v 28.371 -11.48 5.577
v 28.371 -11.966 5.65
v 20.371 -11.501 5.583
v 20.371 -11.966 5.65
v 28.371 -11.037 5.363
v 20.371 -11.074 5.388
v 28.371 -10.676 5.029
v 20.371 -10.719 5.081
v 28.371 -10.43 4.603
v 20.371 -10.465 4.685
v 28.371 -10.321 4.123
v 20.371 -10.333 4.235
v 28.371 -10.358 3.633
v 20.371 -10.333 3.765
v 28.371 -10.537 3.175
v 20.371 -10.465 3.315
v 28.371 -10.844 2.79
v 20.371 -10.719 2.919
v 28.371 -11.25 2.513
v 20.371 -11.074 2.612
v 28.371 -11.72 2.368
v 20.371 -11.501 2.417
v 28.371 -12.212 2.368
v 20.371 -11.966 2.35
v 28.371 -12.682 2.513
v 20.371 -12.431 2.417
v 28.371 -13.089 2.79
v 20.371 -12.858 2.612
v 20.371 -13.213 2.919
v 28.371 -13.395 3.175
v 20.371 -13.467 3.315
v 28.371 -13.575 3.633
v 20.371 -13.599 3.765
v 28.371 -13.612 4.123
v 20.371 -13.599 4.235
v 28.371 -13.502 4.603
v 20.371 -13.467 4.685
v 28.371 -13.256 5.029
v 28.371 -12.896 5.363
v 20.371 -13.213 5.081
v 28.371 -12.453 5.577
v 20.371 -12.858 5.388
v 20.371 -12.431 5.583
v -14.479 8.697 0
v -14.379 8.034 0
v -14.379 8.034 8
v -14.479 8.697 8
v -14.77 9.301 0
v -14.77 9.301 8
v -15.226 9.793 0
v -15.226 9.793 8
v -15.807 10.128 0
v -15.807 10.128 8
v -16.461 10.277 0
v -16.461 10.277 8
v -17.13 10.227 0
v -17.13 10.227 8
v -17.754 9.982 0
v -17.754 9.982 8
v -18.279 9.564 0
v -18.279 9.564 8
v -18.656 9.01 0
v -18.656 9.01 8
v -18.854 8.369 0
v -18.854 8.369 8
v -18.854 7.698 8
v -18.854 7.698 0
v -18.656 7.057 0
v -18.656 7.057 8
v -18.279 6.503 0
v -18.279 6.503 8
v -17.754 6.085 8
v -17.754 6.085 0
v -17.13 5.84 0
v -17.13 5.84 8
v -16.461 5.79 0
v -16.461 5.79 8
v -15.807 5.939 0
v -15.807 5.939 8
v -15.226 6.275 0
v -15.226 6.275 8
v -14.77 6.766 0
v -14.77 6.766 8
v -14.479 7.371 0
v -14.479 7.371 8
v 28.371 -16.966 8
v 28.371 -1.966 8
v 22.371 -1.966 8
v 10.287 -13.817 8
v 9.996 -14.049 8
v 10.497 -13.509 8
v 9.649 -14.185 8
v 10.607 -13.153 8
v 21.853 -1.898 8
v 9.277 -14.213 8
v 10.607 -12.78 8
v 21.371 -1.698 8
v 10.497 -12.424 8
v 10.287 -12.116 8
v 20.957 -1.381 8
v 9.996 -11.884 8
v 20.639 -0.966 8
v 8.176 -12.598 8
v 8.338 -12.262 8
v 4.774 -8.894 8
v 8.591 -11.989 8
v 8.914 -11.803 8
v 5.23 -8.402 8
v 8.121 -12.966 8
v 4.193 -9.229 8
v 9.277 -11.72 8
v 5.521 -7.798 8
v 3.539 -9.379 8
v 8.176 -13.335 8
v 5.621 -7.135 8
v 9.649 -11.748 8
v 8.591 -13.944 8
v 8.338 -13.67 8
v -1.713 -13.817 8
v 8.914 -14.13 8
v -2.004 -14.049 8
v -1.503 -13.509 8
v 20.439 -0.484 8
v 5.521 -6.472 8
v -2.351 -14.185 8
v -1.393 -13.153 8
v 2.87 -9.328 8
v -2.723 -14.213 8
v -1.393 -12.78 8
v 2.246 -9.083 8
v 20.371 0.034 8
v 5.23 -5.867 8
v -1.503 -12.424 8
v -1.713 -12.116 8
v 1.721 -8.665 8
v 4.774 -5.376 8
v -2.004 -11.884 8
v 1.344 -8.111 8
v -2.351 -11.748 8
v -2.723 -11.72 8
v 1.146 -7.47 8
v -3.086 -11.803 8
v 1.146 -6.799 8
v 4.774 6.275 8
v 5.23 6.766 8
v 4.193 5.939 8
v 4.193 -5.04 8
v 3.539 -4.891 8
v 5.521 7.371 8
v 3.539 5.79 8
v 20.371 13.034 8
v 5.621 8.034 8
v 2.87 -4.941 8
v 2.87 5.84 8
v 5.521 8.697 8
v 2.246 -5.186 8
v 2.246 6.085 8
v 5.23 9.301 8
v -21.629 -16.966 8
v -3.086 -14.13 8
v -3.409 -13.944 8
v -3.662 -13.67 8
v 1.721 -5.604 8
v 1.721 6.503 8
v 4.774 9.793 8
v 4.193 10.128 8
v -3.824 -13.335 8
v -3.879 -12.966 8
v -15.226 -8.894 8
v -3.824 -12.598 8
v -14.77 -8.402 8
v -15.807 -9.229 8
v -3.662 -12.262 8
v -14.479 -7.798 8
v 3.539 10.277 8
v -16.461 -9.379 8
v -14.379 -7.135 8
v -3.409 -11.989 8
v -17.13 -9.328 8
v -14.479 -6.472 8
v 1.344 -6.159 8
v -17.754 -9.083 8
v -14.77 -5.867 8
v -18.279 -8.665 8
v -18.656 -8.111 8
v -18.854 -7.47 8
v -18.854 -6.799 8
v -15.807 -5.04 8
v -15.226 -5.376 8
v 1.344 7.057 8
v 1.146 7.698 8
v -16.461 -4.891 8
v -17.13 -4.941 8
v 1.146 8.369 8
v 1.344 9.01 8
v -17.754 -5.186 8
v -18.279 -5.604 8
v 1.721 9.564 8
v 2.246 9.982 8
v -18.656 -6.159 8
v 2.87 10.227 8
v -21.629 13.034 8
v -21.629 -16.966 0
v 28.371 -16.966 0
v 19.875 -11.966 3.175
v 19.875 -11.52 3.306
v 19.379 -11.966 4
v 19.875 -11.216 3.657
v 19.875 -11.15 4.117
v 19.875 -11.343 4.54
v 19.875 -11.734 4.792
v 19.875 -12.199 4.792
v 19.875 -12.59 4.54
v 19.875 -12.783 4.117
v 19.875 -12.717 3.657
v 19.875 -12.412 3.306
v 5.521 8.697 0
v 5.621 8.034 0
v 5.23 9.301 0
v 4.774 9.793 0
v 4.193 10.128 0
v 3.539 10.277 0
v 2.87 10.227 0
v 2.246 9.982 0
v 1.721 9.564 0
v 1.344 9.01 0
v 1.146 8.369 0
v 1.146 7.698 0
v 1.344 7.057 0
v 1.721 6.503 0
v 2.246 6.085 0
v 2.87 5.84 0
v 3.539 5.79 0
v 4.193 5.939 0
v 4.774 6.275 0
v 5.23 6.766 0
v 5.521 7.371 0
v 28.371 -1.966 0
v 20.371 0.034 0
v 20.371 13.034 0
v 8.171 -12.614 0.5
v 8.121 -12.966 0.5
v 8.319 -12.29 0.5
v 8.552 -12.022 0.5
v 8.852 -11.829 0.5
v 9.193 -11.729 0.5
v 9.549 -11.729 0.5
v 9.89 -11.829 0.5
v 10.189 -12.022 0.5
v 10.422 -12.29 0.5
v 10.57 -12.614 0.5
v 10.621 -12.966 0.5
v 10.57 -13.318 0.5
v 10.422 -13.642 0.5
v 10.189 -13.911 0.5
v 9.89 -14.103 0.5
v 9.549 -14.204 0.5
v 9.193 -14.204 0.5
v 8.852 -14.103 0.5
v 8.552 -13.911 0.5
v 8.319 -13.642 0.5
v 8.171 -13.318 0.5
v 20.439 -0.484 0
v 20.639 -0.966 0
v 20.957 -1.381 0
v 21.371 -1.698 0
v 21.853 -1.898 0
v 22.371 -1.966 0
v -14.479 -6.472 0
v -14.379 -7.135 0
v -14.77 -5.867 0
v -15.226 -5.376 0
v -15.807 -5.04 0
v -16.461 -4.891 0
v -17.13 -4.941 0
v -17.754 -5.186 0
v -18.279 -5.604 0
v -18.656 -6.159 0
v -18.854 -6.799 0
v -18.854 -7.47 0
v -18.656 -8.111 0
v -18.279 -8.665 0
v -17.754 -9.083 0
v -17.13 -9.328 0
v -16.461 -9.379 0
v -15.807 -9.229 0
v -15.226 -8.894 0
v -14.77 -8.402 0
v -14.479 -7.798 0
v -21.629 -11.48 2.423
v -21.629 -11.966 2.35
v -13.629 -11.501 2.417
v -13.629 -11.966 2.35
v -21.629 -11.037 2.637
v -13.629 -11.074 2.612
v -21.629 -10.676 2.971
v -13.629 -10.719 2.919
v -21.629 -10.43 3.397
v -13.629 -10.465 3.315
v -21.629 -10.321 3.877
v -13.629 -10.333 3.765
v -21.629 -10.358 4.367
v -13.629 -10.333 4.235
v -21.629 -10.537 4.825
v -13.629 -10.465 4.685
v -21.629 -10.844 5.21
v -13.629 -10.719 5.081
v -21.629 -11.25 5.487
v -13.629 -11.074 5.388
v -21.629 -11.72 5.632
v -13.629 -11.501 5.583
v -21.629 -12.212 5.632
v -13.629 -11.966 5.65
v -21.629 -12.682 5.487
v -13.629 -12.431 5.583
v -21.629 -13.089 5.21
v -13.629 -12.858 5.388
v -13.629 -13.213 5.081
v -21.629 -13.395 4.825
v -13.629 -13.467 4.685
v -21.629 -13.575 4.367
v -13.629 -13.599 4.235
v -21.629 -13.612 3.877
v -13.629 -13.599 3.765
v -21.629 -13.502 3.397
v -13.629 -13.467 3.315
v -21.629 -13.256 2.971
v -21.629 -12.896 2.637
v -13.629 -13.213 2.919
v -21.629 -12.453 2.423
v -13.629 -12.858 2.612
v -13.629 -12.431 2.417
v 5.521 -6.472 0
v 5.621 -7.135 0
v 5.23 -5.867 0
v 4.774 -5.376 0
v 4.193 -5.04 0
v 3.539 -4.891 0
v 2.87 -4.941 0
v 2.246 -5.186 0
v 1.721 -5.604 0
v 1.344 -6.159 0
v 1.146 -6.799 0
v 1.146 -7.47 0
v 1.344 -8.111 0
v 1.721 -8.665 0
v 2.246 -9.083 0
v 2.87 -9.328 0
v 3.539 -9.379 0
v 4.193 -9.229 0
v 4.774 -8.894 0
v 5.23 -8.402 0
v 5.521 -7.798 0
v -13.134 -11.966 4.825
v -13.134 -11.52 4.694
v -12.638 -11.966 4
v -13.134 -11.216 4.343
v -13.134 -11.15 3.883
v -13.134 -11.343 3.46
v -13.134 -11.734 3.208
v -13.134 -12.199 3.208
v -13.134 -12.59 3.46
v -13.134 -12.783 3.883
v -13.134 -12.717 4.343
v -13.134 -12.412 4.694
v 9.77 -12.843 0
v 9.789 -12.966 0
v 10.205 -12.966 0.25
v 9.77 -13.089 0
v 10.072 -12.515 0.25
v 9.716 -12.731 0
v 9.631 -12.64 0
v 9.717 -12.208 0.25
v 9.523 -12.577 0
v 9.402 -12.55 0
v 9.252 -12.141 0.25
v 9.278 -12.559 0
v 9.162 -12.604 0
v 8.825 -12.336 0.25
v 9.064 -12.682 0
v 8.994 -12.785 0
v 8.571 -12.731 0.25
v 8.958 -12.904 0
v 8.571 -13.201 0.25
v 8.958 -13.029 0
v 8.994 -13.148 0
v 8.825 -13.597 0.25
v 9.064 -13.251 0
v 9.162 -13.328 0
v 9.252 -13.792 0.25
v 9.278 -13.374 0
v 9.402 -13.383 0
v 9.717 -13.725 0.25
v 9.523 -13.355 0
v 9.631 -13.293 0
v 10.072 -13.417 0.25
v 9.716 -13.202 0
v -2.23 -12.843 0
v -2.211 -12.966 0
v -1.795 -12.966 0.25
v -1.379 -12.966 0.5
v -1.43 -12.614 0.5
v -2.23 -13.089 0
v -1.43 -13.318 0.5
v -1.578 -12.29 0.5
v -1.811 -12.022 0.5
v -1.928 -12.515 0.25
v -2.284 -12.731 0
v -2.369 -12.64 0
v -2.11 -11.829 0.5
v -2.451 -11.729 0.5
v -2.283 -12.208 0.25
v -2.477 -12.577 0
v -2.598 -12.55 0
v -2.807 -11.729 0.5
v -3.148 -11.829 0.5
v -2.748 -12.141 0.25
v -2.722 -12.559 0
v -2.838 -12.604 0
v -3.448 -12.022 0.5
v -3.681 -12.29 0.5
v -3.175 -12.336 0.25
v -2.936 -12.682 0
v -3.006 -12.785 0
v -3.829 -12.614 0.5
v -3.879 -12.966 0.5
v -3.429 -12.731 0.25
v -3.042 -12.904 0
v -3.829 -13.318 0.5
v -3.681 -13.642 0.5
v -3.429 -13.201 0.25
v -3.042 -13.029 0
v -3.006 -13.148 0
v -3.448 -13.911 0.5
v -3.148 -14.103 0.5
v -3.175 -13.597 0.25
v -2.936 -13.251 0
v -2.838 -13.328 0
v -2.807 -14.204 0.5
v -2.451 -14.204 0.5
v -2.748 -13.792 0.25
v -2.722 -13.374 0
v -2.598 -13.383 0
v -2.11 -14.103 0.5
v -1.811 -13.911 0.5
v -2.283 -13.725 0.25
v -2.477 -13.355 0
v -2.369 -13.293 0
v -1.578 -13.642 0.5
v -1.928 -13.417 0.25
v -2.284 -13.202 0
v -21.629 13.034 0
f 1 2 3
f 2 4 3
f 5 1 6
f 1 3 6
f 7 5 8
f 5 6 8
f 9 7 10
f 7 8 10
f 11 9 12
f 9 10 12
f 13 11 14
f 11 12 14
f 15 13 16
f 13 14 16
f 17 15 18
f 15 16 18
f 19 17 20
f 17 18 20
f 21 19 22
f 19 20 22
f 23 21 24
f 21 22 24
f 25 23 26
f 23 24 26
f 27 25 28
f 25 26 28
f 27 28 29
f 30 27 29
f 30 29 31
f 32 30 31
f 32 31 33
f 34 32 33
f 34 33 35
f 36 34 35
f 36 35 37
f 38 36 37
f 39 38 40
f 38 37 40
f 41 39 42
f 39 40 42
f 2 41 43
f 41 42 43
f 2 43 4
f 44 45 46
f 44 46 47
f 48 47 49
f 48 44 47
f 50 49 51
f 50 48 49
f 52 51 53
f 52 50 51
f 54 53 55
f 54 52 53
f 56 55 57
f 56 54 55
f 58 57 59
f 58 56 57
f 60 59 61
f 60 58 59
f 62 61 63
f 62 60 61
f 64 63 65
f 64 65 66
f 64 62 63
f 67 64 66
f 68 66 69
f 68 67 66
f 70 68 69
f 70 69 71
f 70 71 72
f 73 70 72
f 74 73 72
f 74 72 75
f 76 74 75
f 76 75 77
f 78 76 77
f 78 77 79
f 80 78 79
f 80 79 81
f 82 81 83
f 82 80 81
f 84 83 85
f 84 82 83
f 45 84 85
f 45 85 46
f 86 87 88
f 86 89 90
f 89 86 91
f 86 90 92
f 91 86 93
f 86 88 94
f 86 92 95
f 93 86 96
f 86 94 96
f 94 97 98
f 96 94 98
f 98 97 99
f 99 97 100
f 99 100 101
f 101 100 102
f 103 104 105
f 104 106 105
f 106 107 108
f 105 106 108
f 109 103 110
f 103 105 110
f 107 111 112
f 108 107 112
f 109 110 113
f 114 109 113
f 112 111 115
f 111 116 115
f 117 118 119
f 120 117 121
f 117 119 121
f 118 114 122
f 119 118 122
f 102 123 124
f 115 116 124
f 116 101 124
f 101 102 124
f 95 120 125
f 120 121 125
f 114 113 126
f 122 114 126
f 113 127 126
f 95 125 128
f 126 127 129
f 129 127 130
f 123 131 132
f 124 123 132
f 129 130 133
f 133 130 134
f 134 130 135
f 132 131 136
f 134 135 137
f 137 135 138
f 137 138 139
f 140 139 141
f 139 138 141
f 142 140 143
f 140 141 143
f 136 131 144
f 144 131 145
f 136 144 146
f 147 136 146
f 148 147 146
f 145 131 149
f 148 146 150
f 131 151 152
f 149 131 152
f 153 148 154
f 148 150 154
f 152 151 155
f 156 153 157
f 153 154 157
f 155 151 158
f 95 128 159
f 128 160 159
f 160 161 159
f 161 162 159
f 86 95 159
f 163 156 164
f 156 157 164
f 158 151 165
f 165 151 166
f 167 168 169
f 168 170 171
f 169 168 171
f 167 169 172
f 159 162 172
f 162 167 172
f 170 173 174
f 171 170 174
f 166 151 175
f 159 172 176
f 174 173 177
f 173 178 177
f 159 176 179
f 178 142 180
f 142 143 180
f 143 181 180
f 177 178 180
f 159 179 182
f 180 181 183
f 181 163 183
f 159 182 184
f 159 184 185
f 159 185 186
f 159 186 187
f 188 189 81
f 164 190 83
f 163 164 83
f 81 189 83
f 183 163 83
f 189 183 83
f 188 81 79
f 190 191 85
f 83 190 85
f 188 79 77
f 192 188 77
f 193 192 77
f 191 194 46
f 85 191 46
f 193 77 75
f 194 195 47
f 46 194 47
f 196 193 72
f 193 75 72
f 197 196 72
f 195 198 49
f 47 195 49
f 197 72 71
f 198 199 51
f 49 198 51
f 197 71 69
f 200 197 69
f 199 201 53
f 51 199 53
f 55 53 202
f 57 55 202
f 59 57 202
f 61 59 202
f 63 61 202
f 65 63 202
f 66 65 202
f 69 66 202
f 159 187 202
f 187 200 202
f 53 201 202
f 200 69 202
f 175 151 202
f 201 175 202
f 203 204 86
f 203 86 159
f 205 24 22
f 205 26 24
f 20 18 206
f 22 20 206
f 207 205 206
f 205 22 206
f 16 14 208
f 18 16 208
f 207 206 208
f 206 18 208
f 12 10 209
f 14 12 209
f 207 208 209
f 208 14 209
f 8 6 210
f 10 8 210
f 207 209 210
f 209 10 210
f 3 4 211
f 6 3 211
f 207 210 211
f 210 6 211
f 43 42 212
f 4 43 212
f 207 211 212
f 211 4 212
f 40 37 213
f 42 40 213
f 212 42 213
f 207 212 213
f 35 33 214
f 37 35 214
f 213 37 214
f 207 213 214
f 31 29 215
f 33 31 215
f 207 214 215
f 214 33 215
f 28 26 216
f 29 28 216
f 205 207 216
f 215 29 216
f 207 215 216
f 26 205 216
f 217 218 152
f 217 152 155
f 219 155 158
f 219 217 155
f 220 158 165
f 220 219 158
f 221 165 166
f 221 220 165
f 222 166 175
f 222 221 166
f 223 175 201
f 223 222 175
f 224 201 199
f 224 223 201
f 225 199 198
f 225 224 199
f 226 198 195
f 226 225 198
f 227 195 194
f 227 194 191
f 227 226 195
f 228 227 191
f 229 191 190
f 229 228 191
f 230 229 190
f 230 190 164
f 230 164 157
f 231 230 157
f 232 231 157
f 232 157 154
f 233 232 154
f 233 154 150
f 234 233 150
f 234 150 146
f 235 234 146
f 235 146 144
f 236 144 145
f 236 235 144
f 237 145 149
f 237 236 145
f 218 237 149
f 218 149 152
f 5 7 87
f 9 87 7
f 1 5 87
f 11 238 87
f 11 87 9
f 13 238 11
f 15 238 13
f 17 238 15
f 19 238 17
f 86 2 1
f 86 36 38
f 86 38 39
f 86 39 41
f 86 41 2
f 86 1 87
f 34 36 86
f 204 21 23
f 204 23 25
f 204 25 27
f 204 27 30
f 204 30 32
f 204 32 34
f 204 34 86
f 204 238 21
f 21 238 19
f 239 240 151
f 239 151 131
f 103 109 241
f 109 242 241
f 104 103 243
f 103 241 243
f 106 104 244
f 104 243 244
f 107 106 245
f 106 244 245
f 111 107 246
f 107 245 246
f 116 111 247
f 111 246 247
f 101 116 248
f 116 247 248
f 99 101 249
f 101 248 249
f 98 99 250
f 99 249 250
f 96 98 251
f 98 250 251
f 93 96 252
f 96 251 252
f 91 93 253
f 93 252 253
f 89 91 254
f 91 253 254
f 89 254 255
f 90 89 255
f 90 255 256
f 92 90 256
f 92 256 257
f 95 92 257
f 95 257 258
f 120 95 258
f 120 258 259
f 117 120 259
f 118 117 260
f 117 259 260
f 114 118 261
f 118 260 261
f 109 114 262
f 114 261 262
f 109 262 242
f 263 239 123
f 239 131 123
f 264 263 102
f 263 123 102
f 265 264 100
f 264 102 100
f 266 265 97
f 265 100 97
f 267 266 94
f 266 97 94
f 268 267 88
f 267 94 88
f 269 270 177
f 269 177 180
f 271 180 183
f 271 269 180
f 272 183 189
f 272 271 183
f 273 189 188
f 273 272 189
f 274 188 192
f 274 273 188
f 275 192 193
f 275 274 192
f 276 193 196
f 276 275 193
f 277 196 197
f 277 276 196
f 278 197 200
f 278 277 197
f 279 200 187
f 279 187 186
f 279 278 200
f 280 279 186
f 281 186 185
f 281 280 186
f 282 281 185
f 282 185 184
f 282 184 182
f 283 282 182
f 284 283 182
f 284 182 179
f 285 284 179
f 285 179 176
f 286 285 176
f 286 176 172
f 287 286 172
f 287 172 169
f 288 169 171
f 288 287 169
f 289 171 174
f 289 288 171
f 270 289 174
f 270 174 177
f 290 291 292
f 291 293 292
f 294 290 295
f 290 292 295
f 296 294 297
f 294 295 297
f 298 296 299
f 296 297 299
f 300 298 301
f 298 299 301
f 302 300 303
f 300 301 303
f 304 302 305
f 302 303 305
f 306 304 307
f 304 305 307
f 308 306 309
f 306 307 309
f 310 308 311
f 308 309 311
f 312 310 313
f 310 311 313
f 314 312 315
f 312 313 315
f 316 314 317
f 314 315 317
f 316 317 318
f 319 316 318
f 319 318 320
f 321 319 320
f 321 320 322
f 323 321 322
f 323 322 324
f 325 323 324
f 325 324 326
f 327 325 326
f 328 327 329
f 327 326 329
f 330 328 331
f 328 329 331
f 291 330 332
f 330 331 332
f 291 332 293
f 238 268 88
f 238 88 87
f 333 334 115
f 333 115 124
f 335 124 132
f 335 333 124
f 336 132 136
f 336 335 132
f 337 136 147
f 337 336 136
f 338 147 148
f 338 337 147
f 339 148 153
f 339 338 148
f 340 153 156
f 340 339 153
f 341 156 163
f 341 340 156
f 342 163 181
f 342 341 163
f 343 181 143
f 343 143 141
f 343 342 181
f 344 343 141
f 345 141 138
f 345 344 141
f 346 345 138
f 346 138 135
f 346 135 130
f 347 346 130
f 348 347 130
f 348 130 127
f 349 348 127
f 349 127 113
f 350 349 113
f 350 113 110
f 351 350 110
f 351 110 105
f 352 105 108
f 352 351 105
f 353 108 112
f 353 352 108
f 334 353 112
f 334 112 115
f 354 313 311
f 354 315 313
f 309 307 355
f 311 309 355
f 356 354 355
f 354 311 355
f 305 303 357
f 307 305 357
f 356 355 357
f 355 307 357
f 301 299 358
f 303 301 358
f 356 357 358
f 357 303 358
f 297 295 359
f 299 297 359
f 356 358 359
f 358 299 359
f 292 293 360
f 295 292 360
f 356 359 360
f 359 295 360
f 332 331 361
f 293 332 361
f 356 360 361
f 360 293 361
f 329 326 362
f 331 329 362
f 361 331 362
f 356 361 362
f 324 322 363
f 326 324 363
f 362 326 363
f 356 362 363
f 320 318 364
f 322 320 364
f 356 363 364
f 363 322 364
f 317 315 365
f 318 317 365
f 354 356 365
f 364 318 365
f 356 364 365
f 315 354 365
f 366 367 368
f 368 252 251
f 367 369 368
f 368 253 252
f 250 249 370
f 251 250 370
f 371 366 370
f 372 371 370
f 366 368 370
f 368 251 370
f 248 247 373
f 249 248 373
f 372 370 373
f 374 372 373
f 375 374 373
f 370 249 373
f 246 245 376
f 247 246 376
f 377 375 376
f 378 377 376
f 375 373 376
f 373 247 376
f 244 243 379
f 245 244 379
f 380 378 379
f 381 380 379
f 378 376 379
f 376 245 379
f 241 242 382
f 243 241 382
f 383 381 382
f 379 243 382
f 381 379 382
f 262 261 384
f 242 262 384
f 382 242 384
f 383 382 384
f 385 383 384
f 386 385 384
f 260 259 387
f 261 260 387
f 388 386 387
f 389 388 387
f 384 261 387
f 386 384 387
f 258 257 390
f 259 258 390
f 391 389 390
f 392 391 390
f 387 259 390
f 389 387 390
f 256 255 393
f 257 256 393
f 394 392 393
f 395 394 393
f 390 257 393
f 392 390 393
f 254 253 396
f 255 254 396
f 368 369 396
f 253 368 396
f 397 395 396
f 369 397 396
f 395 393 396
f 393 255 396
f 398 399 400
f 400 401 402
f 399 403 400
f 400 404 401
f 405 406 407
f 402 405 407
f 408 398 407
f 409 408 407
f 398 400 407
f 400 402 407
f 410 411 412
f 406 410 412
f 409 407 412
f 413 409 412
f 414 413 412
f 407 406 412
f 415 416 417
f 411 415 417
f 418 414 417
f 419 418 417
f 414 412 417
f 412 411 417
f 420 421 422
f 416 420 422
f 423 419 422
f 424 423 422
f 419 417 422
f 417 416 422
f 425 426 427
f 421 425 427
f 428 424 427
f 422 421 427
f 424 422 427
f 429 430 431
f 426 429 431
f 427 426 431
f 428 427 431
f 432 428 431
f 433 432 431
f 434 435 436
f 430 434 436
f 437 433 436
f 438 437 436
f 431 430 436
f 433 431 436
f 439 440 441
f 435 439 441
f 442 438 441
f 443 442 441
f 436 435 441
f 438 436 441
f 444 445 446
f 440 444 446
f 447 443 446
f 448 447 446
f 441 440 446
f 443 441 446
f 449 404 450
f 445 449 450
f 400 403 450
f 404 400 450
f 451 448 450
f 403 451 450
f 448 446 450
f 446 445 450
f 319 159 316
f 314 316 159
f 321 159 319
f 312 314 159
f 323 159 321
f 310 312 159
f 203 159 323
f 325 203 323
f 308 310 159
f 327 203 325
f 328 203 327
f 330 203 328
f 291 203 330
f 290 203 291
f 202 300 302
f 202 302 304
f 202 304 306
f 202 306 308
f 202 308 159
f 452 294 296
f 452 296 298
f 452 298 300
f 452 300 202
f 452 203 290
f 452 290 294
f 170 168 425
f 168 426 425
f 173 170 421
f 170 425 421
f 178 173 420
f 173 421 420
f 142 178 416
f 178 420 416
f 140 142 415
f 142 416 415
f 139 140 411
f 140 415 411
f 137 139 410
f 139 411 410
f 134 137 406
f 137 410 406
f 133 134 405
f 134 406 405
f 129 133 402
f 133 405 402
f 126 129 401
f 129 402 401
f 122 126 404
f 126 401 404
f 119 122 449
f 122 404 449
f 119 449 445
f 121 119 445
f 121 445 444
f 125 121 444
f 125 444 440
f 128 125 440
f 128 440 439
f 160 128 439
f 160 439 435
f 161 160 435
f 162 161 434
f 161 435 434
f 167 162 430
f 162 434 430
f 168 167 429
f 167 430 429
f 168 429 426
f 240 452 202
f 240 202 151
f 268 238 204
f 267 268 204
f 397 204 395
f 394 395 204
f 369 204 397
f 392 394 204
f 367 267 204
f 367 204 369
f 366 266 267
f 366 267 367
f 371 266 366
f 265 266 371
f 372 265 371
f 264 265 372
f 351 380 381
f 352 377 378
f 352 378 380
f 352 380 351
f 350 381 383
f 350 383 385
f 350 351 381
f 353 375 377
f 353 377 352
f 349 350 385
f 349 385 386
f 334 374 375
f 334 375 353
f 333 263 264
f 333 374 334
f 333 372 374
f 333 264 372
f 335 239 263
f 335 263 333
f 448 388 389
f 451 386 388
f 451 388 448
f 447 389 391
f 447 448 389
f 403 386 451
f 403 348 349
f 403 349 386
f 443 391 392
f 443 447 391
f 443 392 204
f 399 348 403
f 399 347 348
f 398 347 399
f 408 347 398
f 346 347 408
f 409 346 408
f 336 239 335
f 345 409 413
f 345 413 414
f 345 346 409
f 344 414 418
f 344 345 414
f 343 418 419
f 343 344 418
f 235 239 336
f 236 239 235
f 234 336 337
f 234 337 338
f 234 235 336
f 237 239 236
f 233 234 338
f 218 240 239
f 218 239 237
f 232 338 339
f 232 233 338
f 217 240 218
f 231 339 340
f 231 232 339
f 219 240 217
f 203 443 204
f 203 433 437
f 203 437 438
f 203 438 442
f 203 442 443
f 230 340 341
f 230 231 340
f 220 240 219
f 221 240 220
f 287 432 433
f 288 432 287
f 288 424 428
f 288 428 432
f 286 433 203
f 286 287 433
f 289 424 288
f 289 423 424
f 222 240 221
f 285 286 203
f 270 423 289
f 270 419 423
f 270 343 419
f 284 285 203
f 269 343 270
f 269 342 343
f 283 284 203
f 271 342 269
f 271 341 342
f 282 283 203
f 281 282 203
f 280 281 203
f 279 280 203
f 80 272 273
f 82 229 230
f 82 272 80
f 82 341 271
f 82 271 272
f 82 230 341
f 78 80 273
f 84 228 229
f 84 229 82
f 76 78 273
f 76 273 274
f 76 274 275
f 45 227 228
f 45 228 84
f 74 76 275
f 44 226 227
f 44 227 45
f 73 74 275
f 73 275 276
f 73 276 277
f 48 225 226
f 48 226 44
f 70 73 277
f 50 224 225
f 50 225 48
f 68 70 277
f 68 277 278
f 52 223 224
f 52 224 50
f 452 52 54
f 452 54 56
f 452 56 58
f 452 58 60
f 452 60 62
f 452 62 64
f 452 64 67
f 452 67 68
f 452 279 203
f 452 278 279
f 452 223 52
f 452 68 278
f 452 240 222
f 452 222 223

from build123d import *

# Parameters (mm, degrees)
SKETCH2_R             = 2.25
BOSS_EXTRUDE1_DEPTH   = 8
M3_TAPPED_HOLE1_D     = 2.5
M3_TAPPED_HOLE1_DEPTH = 7.5
M3_TAPPED_HOLE1_TIP   = 0.751075774
M4_TAPPED_HOLE1_D     = 3.3
M4_TAPPED_HOLE1_DEPTH = 8
M4_TAPPED_HOLE1_TIP   = 0.991420021
M4_TAPPED_HOLE2_D     = 3.3
M4_TAPPED_HOLE2_DEPTH = 8
M4_TAPPED_HOLE2_TIP   = 0.991420021
FILLET1_R             = 2


with BuildPart() as part:
    # Sketch2 → Boss-Extrude1 (new body)
    with BuildSketch(Plane.XY):
        Polygon((-21.629213483, 13.033707865), (20.370786517, 13.033707865), (20.370786517, -1.966292135), (28.370786517, -1.966292135), (28.370786517, -16.966292135), (-21.629213483, -16.966292135), align=None)
        with Locations((-16.629213483, 8.033707865)):
            Circle(SKETCH2_R, mode=Mode.SUBTRACT)
        with Locations((3.370786517, 8.033707865)):
            Circle(SKETCH2_R, mode=Mode.SUBTRACT)
        with Locations((-16.629213483, -7.134831461)):
            Circle(SKETCH2_R, mode=Mode.SUBTRACT)
        with Locations((3.370786517, -7.134831461)):
            Circle(SKETCH2_R, mode=Mode.SUBTRACT)
    extrude(amount=BOSS_EXTRUDE1_DEPTH)

    # M3 Tapped Hole1
    with Locations(Plane.XY.offset(8)):
        with Locations((-2.629213483, -12.966292135), (9.370786517, -12.966292135)):
            Hole(M3_TAPPED_HOLE1_D / 2, depth=M3_TAPPED_HOLE1_DEPTH)
            with Locations((0, 0, -(M3_TAPPED_HOLE1_DEPTH + M3_TAPPED_HOLE1_TIP / 2))):  # 118° drill point
                Cone(0, M3_TAPPED_HOLE1_D / 2, M3_TAPPED_HOLE1_TIP, mode=Mode.SUBTRACT)

    # M4 Tapped Hole1
    with Locations(Plane(origin=(28.370786517, 0, 0), x_dir=(0, 0, -1), z_dir=(1, 0, 0))):
        with Locations((-4, -11.966292135)):
            Hole(M4_TAPPED_HOLE1_D / 2, depth=M4_TAPPED_HOLE1_DEPTH)
            with Locations((0, 0, -(M4_TAPPED_HOLE1_DEPTH + M4_TAPPED_HOLE1_TIP / 2))):  # 118° drill point
                Cone(0, M4_TAPPED_HOLE1_D / 2, M4_TAPPED_HOLE1_TIP, mode=Mode.SUBTRACT)

    # M4 Tapped Hole2
    with Locations(Plane.ZY.offset(21.629213483)):
        with Locations((4, -11.966292135)):
            Hole(M4_TAPPED_HOLE2_D / 2, depth=M4_TAPPED_HOLE2_DEPTH)
            with Locations((0, 0, -(M4_TAPPED_HOLE2_DEPTH + M4_TAPPED_HOLE2_TIP / 2))):  # 118° drill point
                Cone(0, M4_TAPPED_HOLE2_D / 2, M4_TAPPED_HOLE2_TIP, mode=Mode.SUBTRACT)

    # Fillet1
    fillet1_edges = [part.edges().sort_by_distance(p)[0] for p in [
        (20.370786517, -1.966292135, 4),
    ]]
    fillet(fillet1_edges, radius=FILLET1_R)


solid = part.part
